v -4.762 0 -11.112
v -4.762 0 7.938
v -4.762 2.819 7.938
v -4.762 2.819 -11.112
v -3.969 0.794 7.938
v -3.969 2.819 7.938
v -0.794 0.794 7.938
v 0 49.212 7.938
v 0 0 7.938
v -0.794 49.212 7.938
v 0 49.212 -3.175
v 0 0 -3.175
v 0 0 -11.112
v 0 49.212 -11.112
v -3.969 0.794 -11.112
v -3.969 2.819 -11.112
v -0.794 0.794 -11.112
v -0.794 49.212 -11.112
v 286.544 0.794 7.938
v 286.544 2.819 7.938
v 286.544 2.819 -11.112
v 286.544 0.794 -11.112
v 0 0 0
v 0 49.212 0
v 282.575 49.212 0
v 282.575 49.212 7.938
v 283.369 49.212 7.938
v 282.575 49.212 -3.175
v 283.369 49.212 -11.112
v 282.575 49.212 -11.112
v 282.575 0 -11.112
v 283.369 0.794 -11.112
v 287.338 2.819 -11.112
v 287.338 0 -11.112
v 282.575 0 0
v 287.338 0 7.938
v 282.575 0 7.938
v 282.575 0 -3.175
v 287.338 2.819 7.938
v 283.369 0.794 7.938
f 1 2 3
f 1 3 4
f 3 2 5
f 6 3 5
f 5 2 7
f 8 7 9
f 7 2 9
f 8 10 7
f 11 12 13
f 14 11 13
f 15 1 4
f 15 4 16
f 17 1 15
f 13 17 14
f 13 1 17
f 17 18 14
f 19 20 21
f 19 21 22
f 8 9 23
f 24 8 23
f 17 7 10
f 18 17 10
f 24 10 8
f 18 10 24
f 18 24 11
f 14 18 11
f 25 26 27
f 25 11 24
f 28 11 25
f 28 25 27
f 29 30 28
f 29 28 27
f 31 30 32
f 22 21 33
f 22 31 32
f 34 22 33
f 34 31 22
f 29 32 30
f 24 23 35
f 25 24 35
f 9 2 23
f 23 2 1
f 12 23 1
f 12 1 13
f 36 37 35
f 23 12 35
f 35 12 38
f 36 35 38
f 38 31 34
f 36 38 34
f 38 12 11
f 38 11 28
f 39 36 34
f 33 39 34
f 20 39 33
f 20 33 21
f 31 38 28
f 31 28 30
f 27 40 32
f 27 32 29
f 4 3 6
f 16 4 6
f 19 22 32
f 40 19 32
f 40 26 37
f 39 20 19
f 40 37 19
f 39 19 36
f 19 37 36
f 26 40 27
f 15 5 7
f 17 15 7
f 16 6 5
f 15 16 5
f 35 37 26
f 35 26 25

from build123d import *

# Parameters (mm, degrees)
SKETCH1_W           = 282.575
SKETCH1_H           = 3.175
SKETCH1_W_2         = 4.7625
SKETCH1_H_2         = 19.05
BOSS_EXTRUDE1_DEPTH = 49.2125
CUT_EXTRUDE1_DEPTH  = 293.143135402


with BuildPart() as part:
    # Sketch1 → Boss-Extrude1 (new body)
    with BuildSketch(Plane(origin=(0, 0, 0), x_dir=(1, 0, 0), z_dir=(0, 1, 0))):
        with Locations((141.2875, 1.5875)):
            Rectangle(SKETCH1_W, SKETCH1_H)
        with Locations((-2.38125, 1.5875)):
            Rectangle(SKETCH1_W_2, SKETCH1_H_2)
        with Locations((284.95625, 1.5875)):
            Rectangle(SKETCH1_W_2, SKETCH1_H_2)
    extrude(amount=BOSS_EXTRUDE1_DEPTH)

    # Sketch2 → Cut-Extrude1 (cut, through all)
    with BuildSketch(Plane.XY.offset(7.9375)):
        Polygon((-4.7625, 2.81851333), (-3.96875, 2.81851333), (-3.96875, 0.79375), (-0.79375, 0.79375), (-0.79375, 49.2125), (-4.7625, 49.2125), align=None)
        Polygon((287.3375, 2.81851333), (286.54375, 2.81851333), (286.54375, 0.79375), (283.36875, 0.79375), (283.36875, 49.2125), (287.3375, 49.2125), align=None)
    extrude(amount=-CUT_EXTRUDE1_DEPTH, mode=Mode.SUBTRACT)


solid = part.part
